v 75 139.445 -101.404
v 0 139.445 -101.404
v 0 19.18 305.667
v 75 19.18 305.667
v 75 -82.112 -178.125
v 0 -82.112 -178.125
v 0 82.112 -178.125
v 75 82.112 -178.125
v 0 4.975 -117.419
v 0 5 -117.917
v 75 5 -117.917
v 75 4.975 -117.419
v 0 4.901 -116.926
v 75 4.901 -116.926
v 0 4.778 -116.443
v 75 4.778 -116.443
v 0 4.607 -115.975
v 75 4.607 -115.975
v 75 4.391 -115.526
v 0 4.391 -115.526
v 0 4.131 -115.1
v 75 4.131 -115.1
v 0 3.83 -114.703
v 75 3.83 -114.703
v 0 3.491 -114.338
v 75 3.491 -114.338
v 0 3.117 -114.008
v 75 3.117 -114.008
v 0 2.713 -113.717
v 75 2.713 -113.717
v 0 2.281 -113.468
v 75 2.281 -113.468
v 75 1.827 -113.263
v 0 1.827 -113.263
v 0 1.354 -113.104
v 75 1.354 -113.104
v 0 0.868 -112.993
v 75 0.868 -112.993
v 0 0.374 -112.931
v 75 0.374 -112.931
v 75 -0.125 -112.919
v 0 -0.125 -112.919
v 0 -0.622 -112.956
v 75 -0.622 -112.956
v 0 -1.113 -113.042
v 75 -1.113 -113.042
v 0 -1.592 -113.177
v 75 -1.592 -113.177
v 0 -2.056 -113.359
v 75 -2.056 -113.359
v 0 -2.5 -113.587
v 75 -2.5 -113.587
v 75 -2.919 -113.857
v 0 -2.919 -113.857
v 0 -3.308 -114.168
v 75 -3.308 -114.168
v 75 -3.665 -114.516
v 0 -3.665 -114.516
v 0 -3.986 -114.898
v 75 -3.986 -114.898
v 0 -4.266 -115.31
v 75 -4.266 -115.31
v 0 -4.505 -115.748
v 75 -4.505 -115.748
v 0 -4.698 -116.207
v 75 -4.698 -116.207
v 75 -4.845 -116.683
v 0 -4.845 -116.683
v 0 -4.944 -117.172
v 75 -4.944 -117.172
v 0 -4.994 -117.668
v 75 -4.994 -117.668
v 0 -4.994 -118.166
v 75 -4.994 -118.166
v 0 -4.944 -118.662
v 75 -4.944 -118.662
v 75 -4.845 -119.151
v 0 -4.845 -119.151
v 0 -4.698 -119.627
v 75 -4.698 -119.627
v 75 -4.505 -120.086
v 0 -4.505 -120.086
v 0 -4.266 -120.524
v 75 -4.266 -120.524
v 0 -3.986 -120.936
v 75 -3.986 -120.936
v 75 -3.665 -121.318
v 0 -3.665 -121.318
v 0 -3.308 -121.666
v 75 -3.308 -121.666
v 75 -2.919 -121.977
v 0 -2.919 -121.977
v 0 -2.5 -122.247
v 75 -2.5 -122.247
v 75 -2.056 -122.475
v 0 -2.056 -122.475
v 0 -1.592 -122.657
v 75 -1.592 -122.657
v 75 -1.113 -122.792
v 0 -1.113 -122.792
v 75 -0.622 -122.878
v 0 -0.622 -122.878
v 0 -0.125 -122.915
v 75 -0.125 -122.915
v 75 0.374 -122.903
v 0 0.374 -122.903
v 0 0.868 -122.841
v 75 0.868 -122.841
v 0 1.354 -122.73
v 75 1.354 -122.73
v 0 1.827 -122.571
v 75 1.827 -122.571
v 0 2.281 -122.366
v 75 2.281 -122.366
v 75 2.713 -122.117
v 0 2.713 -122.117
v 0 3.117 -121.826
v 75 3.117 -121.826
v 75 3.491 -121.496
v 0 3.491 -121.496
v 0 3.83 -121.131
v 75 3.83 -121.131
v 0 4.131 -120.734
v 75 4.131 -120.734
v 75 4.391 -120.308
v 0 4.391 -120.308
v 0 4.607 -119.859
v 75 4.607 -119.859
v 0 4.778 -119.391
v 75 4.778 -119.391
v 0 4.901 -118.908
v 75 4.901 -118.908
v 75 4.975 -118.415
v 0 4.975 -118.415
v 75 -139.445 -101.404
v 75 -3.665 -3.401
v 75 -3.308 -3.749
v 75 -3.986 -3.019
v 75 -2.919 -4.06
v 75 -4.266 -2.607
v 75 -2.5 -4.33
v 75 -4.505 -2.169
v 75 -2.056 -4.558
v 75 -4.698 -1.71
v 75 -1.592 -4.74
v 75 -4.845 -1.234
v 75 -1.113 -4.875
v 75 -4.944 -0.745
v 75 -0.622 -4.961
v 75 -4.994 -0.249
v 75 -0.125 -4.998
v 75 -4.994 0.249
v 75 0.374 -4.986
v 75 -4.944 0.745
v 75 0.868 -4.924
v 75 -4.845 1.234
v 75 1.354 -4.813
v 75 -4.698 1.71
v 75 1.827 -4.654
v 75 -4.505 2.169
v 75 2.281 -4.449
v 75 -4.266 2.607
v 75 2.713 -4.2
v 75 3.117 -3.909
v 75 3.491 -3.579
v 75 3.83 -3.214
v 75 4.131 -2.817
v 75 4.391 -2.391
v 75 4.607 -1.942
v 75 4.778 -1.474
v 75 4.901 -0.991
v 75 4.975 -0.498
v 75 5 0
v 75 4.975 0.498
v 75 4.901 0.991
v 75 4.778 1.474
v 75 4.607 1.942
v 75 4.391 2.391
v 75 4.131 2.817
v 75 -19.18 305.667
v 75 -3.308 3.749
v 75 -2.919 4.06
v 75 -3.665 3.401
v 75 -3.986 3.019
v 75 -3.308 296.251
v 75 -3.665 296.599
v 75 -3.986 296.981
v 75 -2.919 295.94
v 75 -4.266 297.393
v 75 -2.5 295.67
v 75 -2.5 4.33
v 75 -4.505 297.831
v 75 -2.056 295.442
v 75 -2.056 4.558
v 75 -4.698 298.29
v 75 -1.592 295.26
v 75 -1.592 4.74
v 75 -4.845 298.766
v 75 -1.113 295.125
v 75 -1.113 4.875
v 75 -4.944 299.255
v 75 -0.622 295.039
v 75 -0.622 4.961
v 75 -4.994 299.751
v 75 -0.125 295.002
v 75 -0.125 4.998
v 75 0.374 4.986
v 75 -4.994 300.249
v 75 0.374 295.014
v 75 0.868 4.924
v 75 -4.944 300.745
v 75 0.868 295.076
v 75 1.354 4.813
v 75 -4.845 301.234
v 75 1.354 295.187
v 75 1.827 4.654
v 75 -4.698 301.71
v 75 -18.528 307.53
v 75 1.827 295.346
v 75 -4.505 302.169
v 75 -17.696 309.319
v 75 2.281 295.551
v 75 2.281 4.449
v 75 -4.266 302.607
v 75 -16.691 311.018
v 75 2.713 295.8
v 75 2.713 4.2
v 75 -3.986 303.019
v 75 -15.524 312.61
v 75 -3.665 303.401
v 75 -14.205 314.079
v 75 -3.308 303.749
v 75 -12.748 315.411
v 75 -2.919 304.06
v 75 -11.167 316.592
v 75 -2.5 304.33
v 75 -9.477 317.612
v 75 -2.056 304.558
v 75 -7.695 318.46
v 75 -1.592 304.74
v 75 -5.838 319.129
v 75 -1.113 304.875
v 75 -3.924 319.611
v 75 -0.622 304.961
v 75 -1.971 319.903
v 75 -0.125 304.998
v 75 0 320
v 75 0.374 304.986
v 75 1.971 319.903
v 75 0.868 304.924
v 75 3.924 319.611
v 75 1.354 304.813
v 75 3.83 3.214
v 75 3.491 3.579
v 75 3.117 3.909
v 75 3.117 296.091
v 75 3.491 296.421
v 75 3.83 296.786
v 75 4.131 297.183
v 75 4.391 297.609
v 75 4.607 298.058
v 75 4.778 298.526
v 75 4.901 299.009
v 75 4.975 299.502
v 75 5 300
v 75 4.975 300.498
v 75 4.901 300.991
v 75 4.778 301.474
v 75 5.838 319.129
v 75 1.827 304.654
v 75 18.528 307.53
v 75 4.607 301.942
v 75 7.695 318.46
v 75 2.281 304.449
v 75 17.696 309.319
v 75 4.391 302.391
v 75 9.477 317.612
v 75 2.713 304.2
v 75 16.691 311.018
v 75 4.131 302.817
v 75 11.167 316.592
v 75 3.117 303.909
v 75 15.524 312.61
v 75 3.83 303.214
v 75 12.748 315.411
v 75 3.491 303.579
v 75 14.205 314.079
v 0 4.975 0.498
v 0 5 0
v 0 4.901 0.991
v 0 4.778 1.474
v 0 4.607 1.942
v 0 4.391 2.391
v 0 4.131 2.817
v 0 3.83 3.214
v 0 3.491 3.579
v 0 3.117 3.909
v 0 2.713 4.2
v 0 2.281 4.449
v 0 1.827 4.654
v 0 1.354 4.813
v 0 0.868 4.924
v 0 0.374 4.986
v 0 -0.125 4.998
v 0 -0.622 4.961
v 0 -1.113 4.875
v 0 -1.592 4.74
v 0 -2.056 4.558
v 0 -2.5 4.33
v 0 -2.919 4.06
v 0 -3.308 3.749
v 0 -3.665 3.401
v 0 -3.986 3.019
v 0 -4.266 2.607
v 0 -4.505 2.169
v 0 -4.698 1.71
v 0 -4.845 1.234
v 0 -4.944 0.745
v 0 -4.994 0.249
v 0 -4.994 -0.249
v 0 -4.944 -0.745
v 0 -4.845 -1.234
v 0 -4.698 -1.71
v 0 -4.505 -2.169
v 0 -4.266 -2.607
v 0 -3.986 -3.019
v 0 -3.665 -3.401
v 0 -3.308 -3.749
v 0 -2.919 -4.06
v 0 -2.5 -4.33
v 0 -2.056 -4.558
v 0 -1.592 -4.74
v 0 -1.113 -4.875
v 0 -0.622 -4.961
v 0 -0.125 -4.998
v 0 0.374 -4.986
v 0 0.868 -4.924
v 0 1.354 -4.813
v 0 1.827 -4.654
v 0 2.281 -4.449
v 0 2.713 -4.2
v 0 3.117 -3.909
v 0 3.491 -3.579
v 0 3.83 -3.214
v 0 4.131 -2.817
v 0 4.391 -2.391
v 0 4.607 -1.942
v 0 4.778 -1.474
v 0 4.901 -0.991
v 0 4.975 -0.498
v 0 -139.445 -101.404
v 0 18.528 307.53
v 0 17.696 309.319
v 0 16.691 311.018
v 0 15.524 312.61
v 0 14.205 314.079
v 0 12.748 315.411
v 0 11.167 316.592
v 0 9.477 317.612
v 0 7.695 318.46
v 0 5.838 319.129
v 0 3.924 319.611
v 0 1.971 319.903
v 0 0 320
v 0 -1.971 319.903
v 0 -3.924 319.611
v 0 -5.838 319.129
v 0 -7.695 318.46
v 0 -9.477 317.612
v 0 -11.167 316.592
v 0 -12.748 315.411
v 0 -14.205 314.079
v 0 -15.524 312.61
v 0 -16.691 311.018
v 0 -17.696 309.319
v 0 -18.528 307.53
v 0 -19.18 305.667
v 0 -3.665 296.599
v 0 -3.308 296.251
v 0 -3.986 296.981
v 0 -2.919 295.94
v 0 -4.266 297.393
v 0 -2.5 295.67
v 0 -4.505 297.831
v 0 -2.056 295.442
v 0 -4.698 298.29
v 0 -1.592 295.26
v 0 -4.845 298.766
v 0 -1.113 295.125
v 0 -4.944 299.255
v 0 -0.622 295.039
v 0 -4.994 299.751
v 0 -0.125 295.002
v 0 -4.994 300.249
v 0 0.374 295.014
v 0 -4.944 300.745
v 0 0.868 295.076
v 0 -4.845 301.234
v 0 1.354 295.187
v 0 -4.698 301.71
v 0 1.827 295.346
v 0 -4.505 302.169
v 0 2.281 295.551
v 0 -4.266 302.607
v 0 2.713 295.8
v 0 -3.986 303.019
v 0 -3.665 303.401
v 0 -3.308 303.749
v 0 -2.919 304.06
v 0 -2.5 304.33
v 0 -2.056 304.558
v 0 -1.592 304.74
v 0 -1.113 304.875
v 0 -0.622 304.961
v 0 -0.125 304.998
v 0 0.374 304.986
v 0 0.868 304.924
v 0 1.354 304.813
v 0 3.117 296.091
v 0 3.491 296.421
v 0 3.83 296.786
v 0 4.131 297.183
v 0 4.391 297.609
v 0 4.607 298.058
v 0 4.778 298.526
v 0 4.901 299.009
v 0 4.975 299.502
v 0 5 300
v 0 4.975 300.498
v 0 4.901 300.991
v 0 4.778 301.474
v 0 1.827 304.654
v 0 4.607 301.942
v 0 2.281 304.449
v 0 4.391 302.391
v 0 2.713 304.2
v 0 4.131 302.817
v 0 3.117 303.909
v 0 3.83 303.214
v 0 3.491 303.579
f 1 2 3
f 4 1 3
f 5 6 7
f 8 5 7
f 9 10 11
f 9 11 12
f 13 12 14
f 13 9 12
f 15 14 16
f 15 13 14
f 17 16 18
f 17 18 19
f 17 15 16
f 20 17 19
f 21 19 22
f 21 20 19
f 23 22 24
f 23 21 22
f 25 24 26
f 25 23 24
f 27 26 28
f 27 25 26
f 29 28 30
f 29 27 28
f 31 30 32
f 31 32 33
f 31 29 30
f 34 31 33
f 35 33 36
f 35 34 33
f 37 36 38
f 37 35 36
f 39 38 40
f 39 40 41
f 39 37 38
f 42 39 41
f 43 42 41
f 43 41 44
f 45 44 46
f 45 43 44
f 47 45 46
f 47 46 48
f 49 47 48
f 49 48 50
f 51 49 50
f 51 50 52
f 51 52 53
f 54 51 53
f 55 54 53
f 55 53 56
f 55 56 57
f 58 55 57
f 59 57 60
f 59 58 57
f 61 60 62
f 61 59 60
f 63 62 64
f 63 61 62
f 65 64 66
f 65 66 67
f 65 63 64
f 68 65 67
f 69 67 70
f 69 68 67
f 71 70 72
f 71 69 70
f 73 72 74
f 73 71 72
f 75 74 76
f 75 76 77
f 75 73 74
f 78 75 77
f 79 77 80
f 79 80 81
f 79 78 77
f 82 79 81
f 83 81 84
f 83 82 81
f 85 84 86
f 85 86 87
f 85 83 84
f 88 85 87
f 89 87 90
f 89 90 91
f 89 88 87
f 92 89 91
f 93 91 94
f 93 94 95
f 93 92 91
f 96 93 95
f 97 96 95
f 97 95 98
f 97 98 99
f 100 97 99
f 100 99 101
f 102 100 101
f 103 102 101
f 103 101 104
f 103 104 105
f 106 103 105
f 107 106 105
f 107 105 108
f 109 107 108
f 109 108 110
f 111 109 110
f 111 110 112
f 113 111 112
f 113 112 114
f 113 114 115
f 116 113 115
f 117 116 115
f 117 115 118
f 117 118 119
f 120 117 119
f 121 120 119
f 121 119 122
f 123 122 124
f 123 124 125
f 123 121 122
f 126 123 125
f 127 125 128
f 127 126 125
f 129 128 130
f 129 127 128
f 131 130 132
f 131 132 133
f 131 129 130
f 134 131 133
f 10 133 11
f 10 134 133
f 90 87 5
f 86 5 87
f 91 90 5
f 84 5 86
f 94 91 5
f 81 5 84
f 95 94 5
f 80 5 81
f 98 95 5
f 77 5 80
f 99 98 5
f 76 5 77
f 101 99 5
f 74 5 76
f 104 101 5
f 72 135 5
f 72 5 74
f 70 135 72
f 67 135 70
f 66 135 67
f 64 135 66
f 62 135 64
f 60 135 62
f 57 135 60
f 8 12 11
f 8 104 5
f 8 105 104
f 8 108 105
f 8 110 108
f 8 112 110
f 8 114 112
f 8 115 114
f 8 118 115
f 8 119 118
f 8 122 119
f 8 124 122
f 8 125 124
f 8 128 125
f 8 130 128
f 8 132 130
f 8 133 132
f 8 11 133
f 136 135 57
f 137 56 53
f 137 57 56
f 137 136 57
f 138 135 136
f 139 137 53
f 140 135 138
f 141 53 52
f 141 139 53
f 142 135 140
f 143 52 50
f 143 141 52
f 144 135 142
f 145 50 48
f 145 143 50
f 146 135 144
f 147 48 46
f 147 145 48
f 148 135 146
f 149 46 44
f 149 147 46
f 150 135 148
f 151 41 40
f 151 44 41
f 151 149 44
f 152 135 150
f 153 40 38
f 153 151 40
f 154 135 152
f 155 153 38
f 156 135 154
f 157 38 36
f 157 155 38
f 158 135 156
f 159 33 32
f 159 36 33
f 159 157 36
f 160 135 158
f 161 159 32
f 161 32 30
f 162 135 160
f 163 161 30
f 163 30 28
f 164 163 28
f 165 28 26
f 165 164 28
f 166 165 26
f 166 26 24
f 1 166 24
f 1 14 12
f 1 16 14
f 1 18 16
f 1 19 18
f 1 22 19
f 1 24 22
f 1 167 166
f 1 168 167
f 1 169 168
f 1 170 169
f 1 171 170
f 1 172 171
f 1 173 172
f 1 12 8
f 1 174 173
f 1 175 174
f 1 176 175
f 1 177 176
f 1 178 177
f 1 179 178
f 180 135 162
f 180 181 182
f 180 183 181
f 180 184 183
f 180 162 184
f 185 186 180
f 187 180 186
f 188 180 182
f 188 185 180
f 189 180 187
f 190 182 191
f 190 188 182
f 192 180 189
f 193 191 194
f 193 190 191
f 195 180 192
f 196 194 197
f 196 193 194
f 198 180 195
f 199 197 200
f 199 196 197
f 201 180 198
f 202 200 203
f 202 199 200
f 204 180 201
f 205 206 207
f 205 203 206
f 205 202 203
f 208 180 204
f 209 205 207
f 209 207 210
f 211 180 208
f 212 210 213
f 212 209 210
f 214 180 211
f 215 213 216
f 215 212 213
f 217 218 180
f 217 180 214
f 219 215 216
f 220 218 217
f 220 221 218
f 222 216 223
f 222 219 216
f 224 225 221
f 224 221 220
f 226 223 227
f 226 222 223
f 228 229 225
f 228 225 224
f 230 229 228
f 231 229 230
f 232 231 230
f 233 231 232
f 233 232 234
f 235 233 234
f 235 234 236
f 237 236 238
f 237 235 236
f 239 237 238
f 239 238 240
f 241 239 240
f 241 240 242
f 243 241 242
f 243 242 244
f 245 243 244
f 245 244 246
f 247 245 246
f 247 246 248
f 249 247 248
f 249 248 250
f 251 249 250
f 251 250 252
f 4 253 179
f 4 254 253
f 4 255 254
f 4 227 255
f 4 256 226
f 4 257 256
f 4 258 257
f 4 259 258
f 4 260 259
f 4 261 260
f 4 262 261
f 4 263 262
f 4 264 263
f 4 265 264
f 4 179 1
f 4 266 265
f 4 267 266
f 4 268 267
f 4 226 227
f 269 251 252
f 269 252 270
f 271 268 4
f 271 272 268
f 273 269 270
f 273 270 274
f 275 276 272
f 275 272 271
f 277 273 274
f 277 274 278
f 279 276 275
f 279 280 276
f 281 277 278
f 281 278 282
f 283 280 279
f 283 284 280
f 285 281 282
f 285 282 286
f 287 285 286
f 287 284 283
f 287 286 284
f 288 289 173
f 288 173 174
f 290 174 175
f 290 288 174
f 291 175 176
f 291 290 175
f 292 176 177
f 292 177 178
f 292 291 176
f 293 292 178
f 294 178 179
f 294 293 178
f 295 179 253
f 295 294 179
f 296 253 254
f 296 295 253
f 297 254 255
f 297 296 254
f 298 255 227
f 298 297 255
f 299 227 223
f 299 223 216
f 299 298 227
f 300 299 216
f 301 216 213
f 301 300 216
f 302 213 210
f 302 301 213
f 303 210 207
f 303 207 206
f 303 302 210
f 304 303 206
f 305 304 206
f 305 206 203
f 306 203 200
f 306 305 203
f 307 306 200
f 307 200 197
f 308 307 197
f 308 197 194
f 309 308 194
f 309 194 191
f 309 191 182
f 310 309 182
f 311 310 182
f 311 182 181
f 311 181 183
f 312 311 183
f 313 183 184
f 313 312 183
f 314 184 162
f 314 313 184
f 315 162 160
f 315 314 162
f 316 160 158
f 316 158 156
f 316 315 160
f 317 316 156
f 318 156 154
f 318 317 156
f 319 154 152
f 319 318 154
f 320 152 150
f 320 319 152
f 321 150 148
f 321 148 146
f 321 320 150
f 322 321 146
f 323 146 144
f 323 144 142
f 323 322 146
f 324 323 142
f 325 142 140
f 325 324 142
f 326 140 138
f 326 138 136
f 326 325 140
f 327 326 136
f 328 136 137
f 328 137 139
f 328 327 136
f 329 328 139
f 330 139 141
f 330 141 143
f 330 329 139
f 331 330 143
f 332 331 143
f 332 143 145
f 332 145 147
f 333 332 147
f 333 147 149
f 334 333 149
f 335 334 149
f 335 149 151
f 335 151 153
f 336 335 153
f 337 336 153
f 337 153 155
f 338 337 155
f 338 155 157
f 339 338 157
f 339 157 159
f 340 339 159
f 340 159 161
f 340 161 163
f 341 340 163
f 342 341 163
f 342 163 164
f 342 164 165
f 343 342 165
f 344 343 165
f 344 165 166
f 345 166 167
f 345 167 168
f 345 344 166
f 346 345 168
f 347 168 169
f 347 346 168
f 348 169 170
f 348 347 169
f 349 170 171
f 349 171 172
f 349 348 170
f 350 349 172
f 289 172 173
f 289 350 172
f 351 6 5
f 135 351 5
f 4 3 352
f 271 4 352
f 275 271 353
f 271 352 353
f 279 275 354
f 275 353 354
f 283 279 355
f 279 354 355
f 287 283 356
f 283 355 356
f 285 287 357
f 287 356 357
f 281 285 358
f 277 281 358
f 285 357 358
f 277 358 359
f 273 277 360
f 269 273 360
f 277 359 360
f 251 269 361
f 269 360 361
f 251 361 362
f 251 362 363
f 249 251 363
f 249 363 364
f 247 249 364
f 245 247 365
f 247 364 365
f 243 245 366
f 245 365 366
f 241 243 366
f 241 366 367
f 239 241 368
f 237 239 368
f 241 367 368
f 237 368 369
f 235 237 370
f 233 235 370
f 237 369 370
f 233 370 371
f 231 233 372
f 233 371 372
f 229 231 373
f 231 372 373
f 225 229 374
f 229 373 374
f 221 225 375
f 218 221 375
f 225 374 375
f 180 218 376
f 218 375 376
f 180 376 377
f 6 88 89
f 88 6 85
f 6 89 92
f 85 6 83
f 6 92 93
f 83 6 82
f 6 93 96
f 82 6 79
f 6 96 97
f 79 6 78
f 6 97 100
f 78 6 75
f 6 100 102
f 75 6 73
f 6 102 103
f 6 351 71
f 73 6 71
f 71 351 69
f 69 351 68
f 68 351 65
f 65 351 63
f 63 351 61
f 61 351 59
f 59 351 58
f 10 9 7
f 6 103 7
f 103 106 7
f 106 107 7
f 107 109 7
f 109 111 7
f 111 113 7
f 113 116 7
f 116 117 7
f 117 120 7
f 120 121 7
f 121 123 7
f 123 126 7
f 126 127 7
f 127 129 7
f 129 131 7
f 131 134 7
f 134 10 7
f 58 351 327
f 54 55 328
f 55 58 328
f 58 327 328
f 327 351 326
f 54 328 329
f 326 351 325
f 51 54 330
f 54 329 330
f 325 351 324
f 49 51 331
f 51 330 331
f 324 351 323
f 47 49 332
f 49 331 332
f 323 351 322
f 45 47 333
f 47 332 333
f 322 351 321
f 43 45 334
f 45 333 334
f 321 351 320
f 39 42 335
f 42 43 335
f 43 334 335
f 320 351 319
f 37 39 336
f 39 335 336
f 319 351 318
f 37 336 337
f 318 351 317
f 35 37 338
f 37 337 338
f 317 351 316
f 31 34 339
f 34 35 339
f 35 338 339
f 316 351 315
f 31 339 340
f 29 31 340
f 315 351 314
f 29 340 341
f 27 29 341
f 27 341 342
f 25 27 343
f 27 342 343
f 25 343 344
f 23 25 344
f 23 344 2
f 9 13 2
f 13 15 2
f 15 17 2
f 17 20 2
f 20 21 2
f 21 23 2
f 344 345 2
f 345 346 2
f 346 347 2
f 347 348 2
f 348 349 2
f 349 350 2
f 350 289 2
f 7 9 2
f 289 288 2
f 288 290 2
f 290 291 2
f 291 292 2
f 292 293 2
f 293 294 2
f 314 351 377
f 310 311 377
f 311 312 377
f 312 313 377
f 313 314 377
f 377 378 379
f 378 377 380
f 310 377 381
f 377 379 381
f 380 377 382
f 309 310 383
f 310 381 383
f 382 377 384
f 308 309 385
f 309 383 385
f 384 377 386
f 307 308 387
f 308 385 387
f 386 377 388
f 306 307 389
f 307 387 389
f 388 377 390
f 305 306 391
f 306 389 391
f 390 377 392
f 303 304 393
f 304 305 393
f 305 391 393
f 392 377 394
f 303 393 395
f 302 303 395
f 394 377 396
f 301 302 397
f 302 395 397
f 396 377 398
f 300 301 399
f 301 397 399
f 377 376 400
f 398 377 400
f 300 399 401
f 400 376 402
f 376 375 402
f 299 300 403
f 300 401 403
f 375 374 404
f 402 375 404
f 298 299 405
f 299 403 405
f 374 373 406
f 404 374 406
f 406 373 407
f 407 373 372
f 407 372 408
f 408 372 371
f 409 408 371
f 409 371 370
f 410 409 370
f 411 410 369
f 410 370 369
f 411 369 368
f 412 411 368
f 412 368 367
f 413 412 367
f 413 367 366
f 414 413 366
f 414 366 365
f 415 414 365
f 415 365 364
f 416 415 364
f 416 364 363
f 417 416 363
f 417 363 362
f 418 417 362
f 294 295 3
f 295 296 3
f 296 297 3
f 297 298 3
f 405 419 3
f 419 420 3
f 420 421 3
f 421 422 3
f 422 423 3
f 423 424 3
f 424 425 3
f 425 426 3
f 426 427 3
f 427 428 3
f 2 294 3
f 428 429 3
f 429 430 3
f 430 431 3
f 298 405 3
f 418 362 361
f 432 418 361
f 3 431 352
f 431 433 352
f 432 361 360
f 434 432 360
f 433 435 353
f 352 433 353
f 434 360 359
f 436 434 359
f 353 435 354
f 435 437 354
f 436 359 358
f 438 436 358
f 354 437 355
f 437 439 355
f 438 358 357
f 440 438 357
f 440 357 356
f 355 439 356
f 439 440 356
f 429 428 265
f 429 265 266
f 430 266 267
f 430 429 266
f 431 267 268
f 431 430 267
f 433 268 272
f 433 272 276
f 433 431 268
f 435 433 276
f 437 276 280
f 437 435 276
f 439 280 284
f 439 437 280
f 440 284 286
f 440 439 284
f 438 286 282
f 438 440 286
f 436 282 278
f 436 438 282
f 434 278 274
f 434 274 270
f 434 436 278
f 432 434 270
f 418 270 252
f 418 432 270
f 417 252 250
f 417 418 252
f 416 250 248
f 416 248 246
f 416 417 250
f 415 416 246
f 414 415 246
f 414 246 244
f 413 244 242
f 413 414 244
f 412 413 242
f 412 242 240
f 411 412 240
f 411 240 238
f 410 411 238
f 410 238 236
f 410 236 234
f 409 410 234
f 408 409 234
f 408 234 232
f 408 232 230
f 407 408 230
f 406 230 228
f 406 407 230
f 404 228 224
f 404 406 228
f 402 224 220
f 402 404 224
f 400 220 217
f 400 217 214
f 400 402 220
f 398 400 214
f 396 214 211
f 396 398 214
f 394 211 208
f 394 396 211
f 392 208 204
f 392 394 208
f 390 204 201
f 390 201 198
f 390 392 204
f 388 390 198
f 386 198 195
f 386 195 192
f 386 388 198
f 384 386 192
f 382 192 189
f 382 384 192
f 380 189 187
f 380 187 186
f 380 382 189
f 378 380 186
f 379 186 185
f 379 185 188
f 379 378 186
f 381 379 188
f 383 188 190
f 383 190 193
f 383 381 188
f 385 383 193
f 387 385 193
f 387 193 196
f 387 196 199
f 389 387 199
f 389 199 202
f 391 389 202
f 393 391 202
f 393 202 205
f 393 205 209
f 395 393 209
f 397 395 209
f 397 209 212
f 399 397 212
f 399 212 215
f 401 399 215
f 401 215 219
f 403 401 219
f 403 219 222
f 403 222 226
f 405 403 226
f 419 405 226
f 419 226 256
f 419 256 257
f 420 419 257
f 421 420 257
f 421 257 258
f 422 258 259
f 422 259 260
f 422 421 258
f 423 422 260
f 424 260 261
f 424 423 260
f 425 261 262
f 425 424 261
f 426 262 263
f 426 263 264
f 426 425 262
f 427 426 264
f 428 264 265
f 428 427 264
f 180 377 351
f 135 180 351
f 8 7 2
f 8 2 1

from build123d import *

# Parameters (mm, degrees)
F0_R     = 5
F1_DEPTH = 75
F2_SIZE  = 80


# Not quite as in the source:
# - a feature names something its author has since deleted; it is built from what else it names


with BuildPart() as f1:
    # F0 (on Right) → F1 (new body)
    with BuildSketch(Plane.YZ):
        with BuildLine():
            Line((162.1119900143, -178.1254678004), (19.1804298411, 305.6666666667))
            ThreePointArc((19.1804298411, 305.6666666667), (0, 320), (-19.1804298411, 305.6666666667))
            Line((-19.1804298411, 305.6666666667), (-162.1119900143, -178.1254678004))
            Line((-162.1119900143, -178.1254678004), (162.1119900143, -178.1254678004))
        make_face()
        with Locations((0, -117.917008698)):
            Circle(F0_R, mode=Mode.SUBTRACT)
        Circle(F0_R, mode=Mode.SUBTRACT)
        with Locations((0, 300)):
            Circle(F0_R, mode=Mode.SUBTRACT)
    extrude(amount=F1_DEPTH)

    # F2
    f2_edges = [f1.edges().sort_by_distance(p)[0] for p in [
        (37.5, 162.11199, -178.125468),
        (37.5, -162.11199, -178.125468),
    ]]
    chamfer(f2_edges, length=F2_SIZE)


solid = f1.part
